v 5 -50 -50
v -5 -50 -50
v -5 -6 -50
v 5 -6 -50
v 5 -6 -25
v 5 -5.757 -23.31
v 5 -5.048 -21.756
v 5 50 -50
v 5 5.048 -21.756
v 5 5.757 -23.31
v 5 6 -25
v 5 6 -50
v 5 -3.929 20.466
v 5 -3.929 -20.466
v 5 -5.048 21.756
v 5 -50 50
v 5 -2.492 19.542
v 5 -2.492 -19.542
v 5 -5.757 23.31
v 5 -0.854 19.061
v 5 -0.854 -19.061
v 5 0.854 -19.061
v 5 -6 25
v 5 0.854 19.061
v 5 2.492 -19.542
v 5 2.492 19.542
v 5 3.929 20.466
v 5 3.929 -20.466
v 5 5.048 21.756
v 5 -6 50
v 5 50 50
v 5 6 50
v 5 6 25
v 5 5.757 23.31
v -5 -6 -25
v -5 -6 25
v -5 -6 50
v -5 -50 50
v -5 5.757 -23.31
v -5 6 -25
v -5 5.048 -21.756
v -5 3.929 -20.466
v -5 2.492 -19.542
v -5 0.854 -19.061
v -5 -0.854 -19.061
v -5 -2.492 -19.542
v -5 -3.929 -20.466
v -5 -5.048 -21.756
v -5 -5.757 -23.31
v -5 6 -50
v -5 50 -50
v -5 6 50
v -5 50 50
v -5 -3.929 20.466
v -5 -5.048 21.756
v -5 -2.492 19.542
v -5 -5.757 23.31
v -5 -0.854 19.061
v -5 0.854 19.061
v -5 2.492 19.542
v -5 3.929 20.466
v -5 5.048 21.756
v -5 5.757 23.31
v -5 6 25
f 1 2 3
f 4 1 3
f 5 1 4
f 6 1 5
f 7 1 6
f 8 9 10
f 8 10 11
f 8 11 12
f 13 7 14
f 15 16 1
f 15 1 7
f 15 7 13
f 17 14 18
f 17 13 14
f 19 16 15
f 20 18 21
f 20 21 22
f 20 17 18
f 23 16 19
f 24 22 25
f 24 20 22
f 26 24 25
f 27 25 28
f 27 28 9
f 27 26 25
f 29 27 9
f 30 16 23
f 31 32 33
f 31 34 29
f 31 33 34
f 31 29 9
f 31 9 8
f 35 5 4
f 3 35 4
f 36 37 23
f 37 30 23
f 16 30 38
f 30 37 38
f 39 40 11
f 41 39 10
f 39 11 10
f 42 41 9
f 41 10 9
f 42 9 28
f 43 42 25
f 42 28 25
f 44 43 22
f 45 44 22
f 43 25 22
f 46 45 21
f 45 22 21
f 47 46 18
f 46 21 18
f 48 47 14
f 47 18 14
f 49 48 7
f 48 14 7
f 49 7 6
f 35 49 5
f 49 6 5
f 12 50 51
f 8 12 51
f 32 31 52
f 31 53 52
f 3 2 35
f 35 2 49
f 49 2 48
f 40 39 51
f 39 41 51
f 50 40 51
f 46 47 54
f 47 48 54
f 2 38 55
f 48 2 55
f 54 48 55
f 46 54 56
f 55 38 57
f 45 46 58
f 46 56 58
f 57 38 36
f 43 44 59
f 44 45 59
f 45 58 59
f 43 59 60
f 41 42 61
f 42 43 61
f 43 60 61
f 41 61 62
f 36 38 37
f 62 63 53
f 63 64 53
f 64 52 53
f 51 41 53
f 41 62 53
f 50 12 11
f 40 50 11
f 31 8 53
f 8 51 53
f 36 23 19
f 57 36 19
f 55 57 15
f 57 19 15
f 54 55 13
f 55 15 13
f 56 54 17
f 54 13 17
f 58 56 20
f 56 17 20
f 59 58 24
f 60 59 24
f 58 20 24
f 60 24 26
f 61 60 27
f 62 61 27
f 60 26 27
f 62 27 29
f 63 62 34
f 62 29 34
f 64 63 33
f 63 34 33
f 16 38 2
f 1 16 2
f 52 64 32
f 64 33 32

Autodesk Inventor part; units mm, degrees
ref_plane "YZ Plane" through (0, 0, 0) normal (1, 0, 0) x (0, 1, 0)
ref_plane "XZ Plane" through (0, 0, 0) normal (0, 1, 0) x (-1, 0, 0)
ref_plane "XY Plane" through (0, 0, 0) normal (0, 0, 1) x (1, 0, 0)
sketch "Sketch1" plane through (0, 0, 0) normal (1, 0, 0) x (0, 1, 0)
  line L0 (50, 50) -> (-50, 50)
  line L1 (-50, 50) -> (-50, -50)
  line L2 (-50, -50) -> (50, -50)
  line L3 (50, -50) -> (50, 50)
  line L4 (50, 50) -> (-50, -50) construction
  line L5 (-50, 50) -> (50, -50) construction
  point P0 (0, 0)
  dimension "d0" = 100
  dimension "d1" = 100
extrude "Extrusion1" add sketch "Sketch1" along normal mid plane 10
sketch "Sketch2" plane through (5, 0, 0) normal (1, 0, 0) x (0, 0, -1)
  line L0 (-96.0779, 0) -> (-25, 0) construction
  line L1 (-96.0779, -6) -> (-25, -6)
  line L2 (-25, 6) -> (-96.0779, 6)
  arc A0 (-96.0779, 6) -> (-96.0779, -6) centre (-96.0779, 0) ccw
  arc A1 (-25, -6) -> (-25, 6) centre (-25, 0) ccw
  line L3 (-50, 50) -> (-50, -50) projected
  point P0 (0, 0)
  point P1 (-60.539, 0)
  point P2 (-50, 6)
  point P3 (-50, -6)
  dimension "d4" = 25
  dimension "d5" = 6
extrude "Extrusion2" cut sketch "Sketch2" along normal through all both and the other way through all contours L3 L2 A1 L1
mirror "Mirror1" about plane through (0, 0, 0) normal (0, 0, 1) of "Extrusion2"
ref_plane "Work Plane1" through (0, 0, 0) normal (0, 0, 1) x (1, 0, 0)
